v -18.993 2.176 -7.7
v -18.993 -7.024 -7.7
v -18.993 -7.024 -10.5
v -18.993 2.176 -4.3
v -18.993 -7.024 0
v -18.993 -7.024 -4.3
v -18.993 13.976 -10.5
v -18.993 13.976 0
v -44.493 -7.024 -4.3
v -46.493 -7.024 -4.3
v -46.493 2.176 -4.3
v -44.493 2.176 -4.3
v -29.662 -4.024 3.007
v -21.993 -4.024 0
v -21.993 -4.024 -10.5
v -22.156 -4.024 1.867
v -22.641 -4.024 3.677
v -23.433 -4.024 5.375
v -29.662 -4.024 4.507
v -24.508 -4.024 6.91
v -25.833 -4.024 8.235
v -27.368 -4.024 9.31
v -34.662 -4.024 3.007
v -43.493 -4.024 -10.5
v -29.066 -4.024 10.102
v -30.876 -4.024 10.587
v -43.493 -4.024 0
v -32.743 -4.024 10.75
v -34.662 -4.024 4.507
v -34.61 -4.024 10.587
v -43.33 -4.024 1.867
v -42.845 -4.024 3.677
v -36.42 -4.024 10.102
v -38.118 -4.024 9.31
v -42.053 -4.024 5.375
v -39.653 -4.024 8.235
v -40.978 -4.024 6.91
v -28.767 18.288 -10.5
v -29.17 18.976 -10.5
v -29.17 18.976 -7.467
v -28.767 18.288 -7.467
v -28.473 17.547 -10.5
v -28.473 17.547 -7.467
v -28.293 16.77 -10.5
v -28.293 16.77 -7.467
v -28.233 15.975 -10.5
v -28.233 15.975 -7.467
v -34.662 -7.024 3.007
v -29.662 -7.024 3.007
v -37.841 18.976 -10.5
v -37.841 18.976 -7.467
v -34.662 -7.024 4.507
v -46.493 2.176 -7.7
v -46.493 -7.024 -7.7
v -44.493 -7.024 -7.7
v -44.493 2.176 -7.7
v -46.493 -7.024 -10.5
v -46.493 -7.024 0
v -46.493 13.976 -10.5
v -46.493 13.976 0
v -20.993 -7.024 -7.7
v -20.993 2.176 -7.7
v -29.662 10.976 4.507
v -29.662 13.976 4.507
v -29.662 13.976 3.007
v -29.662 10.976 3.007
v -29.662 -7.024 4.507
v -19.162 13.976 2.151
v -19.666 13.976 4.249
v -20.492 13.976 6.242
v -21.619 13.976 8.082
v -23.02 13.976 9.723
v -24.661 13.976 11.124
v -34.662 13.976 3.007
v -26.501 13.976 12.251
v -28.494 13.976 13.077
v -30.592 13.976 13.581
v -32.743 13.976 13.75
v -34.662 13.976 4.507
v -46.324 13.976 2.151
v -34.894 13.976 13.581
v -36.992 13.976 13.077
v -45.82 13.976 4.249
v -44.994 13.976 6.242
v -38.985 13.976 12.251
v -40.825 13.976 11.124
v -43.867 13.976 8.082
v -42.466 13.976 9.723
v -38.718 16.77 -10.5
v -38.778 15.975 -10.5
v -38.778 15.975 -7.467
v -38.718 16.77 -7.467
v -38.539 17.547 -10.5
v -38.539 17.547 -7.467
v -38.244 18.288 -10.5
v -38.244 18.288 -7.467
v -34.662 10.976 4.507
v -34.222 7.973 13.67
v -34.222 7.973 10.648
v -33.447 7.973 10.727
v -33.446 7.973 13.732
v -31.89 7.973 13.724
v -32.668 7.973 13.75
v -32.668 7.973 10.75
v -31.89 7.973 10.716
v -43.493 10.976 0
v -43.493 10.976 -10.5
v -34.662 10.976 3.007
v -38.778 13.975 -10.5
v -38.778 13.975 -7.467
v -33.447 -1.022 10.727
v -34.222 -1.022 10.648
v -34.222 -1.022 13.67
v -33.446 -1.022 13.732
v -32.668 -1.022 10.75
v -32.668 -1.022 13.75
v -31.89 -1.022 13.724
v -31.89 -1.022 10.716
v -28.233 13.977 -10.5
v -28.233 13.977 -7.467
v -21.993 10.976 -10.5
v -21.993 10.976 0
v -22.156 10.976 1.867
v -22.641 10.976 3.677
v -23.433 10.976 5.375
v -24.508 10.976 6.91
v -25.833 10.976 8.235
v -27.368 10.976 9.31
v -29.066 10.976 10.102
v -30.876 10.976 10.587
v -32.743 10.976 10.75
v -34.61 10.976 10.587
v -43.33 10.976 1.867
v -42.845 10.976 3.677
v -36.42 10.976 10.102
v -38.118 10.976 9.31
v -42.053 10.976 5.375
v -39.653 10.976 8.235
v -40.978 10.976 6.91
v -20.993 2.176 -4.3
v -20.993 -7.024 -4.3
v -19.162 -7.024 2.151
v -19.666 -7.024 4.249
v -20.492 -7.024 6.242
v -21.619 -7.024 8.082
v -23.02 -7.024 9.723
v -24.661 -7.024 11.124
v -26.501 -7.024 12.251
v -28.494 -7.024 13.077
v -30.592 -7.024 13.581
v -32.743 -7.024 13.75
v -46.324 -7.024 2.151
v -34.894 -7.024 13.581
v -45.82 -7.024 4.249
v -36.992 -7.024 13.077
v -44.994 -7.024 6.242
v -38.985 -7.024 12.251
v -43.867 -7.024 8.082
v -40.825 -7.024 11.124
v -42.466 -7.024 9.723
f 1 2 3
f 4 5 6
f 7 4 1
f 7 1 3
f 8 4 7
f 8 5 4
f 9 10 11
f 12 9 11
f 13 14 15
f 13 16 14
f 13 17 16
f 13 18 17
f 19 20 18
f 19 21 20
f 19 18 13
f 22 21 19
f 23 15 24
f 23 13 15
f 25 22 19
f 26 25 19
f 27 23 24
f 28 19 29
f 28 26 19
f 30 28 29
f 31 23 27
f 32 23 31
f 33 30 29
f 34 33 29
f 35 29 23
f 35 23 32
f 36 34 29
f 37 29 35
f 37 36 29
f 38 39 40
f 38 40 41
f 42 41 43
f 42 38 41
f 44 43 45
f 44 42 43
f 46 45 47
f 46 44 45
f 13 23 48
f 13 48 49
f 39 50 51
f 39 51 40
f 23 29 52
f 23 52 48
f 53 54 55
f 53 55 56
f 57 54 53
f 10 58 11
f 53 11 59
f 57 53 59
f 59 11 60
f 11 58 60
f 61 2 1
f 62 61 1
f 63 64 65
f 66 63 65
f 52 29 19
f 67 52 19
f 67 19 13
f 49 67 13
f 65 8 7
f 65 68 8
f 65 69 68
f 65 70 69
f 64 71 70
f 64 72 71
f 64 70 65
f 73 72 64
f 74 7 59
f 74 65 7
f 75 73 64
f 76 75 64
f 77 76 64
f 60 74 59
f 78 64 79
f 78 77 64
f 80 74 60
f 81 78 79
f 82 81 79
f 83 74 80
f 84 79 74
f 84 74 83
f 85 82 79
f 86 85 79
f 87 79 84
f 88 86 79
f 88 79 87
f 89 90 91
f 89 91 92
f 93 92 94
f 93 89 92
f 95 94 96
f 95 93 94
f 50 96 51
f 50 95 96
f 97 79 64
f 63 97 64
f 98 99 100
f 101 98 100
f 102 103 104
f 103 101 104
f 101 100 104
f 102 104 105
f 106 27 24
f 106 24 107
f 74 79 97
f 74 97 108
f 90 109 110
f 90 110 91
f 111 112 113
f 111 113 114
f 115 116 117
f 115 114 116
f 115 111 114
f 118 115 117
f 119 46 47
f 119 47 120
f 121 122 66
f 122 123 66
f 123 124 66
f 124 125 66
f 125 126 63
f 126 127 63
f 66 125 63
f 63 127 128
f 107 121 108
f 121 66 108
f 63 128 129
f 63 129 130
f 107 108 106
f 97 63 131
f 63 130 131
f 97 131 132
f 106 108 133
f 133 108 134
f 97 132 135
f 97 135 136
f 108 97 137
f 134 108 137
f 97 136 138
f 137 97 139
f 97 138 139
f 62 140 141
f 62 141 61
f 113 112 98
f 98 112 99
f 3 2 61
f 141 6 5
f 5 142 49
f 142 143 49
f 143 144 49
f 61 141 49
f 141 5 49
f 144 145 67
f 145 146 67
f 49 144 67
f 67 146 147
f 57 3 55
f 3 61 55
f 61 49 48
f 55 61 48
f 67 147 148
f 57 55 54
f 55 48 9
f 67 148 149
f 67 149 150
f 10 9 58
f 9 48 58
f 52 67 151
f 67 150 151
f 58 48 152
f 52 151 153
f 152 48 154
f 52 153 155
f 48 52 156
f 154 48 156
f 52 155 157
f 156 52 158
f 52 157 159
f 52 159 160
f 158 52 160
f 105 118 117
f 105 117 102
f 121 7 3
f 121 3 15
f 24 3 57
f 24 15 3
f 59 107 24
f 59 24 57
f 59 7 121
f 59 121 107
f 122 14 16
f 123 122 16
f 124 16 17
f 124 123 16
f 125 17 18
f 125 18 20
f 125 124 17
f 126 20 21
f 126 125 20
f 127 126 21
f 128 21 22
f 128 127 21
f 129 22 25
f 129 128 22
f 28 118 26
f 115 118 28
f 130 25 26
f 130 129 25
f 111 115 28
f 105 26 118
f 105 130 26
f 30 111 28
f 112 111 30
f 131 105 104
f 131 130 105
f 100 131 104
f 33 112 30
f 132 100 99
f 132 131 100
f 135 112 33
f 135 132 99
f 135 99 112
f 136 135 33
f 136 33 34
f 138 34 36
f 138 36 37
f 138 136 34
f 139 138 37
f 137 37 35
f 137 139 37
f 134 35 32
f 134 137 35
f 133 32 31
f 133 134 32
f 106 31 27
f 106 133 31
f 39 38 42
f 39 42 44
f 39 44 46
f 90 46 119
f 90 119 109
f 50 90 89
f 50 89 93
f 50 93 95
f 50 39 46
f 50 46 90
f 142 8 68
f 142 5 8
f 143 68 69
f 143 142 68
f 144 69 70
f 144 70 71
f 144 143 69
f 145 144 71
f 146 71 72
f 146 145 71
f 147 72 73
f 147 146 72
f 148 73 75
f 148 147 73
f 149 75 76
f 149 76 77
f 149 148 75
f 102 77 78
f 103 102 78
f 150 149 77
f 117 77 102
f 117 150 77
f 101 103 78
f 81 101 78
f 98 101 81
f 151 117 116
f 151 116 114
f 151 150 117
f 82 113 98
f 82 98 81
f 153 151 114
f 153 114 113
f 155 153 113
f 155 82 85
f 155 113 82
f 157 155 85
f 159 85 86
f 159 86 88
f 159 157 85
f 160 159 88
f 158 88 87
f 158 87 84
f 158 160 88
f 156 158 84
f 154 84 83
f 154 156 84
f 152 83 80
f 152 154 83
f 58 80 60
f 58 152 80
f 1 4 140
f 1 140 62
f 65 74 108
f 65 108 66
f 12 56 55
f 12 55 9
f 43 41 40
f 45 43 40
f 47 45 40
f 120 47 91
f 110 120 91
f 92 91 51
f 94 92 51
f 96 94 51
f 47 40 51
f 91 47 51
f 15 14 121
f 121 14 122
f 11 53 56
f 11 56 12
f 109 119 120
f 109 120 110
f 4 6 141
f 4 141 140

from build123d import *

# Parameters (mm, degrees)
REVOLVE_1_ANGLE     = 180
SKETCH_5_W          = 27.5
SKETCH_5_H          = 21
SKETCH_5_W_2        = 21.5
SKETCH_5_H_2        = 15
EXTRUDE_1_DEPTH     = 10.5
SKETCH_6_W          = 2.331495027
SKETCH_6_H          = 8.995198028
CUT_EXTRUDE_1_DEPTH = 14.75
SKETCH_7_W          = 5
SKETCH_7_H          = 1.5
CUT_EXTRUDE_2_DEPTH = 22
EXTRUDE_2_DEPTH     = 3.033498617
SKETCH_10_W         = 3.4
SKETCH_10_H         = 9.803428708
CUT_EXTRUDE_3_DEPTH = 2
SKETCH_11_W         = 3.4
SKETCH_11_H         = 10.345530218
CUT_EXTRUDE_4_DEPTH = 2


with BuildPart() as part:
    # Эскиз1 → Повернуть1 (revolve)
    with BuildSketch(Plane.XY):
        Polygon((-32.743084191, 13.975613819), (-18.993084191, 13.975613819), (-18.993084191, -7.024386181), (-32.743084191, -7.024386181), (-32.743084191, -4.024386181), (-21.993084191, -4.024386181), (-21.993084191, 10.975613819), (-32.743084191, 10.975613819), align=None)
    revolve(axis=Axis((-32.743084191, 13.975613819, 0), (0, -1, 0)), revolution_arc=REVOLVE_1_ANGLE)

    # Эскиз5 → Бобышка-Вытянуть1 (add)
    with BuildSketch(Plane(origin=(0, 0, 0), x_dir=(-1, 0, 0), z_dir=(0, 0, -1))):
        with Locations((32.743084191, 3.475613819)):
            Rectangle(SKETCH_5_W, SKETCH_5_H)
        with Locations((32.743084191, 3.475613819)):
            Rectangle(SKETCH_5_W_2, SKETCH_5_H_2, mode=Mode.SUBTRACT)
    extrude(amount=EXTRUDE_1_DEPTH)

    # Эскиз6 → Вырез-Вытянуть1 (cut, through all)
    with BuildSketch(Plane.XY):
        with Locations((-33.056054499, 3.475613819)):
            Rectangle(SKETCH_6_W, SKETCH_6_H)
    extrude(amount=CUT_EXTRUDE_1_DEPTH, mode=Mode.SUBTRACT)

    # Эскиз7 → Вырез-Вытянуть2 (cut, through all)
    with BuildSketch(Plane(origin=(0, 13.975613819, 0), x_dir=(1, 0, 0), z_dir=(0, 1, 0))):
        with Locations((-32.16223421, -3.7570716)):
            Rectangle(SKETCH_7_W, SKETCH_7_H)
    extrude(amount=-CUT_EXTRUDE_2_DEPTH, mode=Mode.SUBTRACT)

    # Эскиз10 → Вырез-Вытянуть3 (cut)
    with BuildSketch(Plane.ZY.offset(46.493084191)):
        with Locations((-6, -2.726100535)):
            Rectangle(SKETCH_10_W, SKETCH_10_H)
    extrude(amount=-CUT_EXTRUDE_3_DEPTH, mode=Mode.SUBTRACT)

    # Эскиз11 → Вырез-Вытянуть4 (cut)
    with BuildSketch(Plane(origin=(-18.993084191, 0, 0), x_dir=(0, 0, -1), z_dir=(1, 0, 0))):
        with Locations((6, -2.99715129)):
            Rectangle(SKETCH_11_W, SKETCH_11_H)
    extrude(amount=-CUT_EXTRUDE_4_DEPTH, mode=Mode.SUBTRACT)


with BuildPart() as body_2:
    # Эскиз9 → Бобышка-Вытянуть2 (new body)
    with BuildSketch(Plane(origin=(0, 0, -10.5), x_dir=(-1, 0, 0), z_dir=(0, 0, -1))):
        with BuildLine():
            Line((28.233170804, 15.974855989), (28.233170804, 13.97664863))
            Line((28.233170804, 13.97664863), (38.77838061, 13.974754187))
            Line((38.77838061, 13.974754187), (38.77838061, 15.974855989))
            ThreePointArc((38.77838061, 15.974855989), (38.538632142, 17.546707944), (37.841189748, 18.975613819))
            Line((37.841189748, 18.975613819), (29.170361666, 18.975613819))
            ThreePointArc((29.170361666, 18.975613819), (28.472919272, 17.546707944), (28.233170804, 15.974855989))
        make_face()
    extrude(amount=-EXTRUDE_2_DEPTH)


solid = Compound([part.part, body_2.part])
